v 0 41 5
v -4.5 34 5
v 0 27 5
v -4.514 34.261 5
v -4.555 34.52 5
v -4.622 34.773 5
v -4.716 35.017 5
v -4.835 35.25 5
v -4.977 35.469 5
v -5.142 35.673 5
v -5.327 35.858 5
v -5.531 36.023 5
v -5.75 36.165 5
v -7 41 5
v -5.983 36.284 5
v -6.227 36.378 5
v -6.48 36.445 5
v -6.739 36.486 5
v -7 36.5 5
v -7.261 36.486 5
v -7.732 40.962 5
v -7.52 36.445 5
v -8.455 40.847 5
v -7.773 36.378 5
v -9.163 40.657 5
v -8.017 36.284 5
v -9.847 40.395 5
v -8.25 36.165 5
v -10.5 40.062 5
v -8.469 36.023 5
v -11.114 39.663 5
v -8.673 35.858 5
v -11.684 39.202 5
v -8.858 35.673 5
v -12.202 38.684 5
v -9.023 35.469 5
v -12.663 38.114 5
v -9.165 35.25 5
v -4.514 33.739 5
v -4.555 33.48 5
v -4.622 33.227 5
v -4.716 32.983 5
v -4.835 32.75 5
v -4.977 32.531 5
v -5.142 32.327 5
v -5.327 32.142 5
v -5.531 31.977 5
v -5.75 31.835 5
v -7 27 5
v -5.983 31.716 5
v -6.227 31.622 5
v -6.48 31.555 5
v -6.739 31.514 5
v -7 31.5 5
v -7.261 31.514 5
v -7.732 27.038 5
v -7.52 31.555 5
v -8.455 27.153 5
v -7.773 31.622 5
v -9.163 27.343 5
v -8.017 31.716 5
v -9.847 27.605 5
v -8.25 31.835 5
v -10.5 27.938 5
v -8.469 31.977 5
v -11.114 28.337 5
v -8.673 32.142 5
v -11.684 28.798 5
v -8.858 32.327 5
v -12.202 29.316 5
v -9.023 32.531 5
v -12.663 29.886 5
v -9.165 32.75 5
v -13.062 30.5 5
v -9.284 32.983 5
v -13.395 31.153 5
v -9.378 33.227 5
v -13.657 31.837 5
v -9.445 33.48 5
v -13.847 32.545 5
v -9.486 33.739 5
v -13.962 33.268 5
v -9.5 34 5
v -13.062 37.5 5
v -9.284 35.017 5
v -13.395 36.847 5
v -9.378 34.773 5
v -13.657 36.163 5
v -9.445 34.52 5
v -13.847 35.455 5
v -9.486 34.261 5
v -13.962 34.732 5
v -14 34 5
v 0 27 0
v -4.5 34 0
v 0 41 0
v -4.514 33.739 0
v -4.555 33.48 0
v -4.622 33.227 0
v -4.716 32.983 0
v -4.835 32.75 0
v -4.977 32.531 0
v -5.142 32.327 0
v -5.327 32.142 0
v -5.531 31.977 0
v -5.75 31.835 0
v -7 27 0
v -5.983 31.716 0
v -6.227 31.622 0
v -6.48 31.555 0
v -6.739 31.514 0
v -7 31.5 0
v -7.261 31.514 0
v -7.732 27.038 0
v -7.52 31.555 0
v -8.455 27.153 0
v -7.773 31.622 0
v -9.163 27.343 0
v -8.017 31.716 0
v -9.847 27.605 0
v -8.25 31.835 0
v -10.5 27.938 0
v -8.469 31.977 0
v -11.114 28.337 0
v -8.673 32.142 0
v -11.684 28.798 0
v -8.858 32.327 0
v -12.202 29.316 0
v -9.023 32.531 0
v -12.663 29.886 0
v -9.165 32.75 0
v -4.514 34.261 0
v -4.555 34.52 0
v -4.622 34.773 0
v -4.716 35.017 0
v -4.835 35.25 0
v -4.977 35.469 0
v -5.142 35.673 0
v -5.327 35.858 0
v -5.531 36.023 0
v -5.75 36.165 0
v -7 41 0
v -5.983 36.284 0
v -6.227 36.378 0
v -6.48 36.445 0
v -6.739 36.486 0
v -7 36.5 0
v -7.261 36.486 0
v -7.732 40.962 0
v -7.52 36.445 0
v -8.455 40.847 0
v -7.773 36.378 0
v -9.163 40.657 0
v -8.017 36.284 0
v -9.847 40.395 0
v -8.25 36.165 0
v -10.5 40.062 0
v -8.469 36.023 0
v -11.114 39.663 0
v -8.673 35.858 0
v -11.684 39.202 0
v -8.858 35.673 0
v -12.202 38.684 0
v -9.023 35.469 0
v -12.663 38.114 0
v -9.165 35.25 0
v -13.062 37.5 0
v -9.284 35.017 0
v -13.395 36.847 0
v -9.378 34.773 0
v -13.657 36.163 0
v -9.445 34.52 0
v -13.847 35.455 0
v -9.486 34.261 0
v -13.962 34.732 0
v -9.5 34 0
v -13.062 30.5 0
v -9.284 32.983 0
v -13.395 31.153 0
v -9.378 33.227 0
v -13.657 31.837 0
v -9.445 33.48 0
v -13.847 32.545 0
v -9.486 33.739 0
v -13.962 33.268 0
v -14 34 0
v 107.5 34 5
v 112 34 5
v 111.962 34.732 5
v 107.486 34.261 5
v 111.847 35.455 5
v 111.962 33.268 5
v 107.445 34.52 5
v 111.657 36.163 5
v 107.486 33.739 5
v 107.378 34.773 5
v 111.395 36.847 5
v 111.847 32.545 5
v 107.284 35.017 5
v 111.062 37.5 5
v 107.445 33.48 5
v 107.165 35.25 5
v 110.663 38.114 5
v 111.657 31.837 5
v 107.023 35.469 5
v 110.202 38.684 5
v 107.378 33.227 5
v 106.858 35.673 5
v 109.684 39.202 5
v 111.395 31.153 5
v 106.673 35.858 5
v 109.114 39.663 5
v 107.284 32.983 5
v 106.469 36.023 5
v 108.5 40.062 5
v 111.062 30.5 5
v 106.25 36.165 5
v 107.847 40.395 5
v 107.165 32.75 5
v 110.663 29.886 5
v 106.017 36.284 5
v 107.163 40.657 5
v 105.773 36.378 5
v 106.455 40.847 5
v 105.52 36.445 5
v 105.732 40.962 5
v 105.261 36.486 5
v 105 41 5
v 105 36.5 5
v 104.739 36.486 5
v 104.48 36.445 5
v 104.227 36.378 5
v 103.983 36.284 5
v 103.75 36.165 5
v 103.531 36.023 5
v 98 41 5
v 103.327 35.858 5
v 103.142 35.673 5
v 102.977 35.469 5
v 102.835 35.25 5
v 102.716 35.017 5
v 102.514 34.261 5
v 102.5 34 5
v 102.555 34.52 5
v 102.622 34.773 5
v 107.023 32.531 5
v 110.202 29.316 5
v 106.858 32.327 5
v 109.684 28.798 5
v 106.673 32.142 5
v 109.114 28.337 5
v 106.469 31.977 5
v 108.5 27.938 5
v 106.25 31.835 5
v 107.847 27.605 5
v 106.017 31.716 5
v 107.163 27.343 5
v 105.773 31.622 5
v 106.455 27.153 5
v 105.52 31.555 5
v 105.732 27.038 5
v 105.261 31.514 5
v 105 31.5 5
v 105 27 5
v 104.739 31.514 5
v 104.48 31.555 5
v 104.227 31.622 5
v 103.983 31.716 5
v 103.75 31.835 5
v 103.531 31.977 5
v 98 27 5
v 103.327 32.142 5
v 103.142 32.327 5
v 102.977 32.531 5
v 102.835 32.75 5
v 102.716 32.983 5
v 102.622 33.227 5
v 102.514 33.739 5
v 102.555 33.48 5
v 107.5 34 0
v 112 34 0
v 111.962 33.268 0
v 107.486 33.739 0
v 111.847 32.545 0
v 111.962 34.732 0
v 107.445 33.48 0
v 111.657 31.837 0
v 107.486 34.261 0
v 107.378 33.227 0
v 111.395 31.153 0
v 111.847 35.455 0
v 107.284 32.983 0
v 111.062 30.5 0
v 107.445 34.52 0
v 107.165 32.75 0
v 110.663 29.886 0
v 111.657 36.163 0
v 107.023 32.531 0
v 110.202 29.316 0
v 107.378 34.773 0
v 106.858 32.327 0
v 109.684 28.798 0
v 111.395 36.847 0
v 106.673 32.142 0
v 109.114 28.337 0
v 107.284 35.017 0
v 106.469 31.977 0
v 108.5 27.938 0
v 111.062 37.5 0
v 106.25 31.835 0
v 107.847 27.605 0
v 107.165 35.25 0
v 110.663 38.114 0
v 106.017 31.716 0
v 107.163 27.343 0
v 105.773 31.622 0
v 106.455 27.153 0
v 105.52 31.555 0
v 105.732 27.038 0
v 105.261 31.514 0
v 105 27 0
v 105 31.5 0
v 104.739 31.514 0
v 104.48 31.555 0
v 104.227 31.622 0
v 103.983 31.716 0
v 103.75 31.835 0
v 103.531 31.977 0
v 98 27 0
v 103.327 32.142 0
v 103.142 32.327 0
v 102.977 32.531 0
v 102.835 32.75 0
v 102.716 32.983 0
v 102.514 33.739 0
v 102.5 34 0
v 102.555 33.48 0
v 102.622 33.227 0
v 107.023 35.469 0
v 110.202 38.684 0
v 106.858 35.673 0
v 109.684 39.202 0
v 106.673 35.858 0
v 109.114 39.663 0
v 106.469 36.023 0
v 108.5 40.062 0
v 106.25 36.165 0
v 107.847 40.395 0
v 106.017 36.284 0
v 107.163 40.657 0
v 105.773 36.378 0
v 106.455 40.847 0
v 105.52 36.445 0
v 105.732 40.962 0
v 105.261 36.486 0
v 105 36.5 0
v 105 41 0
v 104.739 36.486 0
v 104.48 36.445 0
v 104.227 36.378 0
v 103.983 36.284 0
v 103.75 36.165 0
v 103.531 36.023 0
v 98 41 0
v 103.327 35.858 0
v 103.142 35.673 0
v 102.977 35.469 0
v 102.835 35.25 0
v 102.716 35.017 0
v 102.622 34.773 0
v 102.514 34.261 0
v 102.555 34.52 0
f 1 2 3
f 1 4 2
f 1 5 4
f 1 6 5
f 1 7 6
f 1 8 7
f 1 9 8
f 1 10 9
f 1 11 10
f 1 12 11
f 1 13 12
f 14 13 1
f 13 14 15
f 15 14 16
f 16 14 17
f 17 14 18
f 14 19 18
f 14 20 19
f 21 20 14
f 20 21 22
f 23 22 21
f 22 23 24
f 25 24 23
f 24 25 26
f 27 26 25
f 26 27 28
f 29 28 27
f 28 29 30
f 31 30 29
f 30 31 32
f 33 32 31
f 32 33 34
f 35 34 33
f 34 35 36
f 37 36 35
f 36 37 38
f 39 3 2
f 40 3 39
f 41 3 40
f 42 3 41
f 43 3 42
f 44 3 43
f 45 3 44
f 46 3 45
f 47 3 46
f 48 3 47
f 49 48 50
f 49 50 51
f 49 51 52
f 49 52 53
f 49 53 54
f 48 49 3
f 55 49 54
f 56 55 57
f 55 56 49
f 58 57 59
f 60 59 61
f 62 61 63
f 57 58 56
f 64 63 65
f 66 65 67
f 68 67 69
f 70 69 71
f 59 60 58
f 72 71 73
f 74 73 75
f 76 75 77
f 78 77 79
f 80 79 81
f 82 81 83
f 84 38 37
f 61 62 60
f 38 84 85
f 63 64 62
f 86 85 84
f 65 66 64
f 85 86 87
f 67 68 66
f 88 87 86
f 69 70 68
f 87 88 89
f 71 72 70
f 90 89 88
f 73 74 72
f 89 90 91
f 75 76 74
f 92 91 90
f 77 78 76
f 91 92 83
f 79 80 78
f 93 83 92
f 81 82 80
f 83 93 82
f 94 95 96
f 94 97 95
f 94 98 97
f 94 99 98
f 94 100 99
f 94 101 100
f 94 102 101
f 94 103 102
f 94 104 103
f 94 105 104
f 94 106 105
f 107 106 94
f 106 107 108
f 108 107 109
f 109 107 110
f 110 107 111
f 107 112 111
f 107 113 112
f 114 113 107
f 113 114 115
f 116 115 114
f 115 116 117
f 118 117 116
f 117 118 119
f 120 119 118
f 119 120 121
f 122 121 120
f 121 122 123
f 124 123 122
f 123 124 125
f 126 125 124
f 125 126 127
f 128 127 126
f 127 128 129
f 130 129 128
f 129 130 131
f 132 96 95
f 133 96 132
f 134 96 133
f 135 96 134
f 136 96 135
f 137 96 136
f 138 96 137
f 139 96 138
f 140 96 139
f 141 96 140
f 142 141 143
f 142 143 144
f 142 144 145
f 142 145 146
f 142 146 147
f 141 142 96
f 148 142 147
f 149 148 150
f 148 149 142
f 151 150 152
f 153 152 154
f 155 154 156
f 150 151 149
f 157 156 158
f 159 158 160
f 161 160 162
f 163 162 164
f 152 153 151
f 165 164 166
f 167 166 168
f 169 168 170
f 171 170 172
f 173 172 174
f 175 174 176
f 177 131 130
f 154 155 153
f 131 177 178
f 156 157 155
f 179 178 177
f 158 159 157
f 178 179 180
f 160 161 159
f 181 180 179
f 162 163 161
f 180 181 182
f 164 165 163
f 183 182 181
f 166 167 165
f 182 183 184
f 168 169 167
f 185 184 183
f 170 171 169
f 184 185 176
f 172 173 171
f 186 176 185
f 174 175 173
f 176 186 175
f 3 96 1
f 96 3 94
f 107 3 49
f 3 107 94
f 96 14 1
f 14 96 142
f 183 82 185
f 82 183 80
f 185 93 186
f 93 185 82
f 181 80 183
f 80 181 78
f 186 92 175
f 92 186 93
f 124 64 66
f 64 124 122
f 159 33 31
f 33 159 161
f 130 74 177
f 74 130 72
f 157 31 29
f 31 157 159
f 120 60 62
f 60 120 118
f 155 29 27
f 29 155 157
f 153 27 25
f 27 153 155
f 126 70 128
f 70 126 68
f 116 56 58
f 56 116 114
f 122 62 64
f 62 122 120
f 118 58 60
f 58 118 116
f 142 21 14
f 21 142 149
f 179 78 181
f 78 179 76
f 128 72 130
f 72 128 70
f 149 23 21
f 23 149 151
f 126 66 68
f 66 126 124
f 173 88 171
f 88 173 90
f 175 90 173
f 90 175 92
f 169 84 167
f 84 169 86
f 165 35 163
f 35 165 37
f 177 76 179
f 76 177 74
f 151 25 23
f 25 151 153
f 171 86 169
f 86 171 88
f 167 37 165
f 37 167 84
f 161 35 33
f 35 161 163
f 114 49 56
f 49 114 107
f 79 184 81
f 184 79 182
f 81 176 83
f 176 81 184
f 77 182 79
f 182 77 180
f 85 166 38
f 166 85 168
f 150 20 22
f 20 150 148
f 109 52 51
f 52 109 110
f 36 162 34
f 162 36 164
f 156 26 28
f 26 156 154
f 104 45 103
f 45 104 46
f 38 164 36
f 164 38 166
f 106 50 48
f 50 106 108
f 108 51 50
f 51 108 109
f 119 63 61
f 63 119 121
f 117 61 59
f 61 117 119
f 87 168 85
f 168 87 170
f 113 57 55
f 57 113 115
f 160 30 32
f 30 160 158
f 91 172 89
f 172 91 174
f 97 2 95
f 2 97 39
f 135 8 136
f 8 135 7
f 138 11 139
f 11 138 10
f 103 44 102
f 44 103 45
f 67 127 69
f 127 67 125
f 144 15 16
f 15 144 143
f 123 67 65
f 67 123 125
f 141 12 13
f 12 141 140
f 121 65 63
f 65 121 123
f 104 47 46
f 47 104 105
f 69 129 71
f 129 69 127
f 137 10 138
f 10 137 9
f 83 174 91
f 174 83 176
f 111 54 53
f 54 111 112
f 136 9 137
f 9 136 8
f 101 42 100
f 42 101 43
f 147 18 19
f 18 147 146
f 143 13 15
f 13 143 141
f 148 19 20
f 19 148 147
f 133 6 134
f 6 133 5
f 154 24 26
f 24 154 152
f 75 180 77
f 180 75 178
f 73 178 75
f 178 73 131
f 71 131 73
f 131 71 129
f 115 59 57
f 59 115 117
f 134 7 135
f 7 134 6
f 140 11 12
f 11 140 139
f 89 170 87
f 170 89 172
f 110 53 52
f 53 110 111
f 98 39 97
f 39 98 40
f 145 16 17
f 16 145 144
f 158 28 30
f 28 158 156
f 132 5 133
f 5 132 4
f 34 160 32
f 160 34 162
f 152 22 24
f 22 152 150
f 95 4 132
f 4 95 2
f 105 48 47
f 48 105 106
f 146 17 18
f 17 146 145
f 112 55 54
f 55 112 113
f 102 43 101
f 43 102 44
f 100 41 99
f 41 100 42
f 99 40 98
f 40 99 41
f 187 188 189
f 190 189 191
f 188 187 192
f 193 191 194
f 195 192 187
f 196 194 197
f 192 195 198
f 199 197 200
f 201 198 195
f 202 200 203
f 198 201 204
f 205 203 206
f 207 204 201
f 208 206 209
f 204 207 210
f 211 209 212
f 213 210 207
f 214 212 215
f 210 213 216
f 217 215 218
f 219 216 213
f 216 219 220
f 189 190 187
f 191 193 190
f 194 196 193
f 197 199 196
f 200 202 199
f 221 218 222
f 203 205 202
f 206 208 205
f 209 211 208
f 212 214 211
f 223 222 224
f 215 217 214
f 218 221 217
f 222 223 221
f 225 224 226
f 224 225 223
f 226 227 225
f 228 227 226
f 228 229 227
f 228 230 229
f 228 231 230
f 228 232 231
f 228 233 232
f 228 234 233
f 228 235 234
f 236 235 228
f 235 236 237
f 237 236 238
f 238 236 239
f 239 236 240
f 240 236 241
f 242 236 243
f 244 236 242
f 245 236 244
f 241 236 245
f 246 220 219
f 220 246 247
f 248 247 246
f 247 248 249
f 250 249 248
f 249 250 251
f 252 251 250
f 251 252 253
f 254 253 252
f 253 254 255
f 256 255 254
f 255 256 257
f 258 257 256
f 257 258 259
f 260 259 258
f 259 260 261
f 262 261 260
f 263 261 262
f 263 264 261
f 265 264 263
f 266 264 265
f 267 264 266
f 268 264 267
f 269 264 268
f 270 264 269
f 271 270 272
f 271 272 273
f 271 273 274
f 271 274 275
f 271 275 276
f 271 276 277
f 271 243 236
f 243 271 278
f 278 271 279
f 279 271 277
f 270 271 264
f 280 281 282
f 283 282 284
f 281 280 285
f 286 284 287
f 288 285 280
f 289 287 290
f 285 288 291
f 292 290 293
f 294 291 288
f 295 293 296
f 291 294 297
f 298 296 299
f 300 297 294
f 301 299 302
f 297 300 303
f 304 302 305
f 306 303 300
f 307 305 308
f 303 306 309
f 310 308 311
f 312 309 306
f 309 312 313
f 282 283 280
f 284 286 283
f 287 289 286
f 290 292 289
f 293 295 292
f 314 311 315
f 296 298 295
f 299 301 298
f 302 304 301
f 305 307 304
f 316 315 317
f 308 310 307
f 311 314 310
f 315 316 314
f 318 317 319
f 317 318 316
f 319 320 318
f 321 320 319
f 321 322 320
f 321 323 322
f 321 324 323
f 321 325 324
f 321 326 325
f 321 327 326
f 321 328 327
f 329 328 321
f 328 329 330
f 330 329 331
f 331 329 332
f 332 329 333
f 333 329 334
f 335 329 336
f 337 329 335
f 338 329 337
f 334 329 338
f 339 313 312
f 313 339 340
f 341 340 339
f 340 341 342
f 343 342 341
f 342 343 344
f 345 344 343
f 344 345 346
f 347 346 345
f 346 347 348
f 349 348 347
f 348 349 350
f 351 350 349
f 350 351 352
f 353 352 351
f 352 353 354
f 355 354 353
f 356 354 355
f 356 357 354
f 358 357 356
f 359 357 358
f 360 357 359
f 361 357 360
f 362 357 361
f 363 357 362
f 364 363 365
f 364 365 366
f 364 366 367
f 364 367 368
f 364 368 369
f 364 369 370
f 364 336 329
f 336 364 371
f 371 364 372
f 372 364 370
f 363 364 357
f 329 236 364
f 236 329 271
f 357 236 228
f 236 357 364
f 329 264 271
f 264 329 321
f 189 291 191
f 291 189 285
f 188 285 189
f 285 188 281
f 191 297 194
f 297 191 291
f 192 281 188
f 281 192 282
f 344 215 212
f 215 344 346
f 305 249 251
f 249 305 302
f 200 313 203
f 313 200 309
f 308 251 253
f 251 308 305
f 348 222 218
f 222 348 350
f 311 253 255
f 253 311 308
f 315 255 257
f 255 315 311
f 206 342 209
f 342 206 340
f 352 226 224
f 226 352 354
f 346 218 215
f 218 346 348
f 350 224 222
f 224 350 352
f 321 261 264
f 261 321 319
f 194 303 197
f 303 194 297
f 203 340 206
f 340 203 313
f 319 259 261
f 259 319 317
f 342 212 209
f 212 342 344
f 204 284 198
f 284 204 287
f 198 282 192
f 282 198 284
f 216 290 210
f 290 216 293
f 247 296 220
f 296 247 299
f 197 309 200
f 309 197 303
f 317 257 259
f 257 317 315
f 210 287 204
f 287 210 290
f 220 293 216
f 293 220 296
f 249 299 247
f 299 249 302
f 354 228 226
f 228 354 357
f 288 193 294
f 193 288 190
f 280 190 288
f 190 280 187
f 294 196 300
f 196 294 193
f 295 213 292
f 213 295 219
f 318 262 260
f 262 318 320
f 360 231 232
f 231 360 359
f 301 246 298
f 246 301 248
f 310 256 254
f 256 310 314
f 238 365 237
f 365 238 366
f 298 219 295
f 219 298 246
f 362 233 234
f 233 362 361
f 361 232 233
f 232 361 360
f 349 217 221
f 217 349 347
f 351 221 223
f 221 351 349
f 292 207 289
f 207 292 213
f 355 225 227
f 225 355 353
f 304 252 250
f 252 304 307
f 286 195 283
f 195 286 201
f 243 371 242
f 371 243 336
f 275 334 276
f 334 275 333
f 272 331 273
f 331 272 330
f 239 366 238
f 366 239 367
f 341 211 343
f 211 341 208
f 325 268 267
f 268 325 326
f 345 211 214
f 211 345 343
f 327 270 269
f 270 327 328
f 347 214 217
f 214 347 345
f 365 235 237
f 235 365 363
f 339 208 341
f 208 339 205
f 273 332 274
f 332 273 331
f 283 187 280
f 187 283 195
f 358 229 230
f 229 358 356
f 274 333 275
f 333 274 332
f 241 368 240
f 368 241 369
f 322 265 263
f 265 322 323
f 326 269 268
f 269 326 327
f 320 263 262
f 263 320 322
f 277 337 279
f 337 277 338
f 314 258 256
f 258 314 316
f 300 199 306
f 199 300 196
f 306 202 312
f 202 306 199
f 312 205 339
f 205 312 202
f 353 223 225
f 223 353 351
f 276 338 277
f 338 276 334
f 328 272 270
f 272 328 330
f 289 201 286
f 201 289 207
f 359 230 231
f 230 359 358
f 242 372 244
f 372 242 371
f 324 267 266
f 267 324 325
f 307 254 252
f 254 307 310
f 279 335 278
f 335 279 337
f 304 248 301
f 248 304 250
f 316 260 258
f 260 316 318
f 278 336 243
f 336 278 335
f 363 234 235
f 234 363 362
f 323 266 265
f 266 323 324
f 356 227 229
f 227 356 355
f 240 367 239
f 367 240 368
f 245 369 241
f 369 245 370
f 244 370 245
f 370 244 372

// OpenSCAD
// file: ../../00_common/screw_bosses.scad
// =============================================================================
// OpenMotorBridge - Screw Bosses & Fastener Primitives
// =============================================================================
// File: hardware/cad/scad/00_common/screw_bosses.scad
// Description: Reusable parametric modules for screw standoffs, corner clamping
//              posts, and mounting ears.
// =============================================================================

include <parameters.scad>;

// 1. Cylindrical Screw Standoff Boss (with center hole)
module screw_boss(outer_r=2.5, inner_r=1.2, h=5.0) {
    difference() {
        cylinder(r=outer_r, h=h, center=false);
        translate([0, 0, -0.1])
            cylinder(r=inner_r, h=h + 0.2, center=false);
    }
}

// 2. Rectangular Corner Clamping Post (with center screw hole)
module corner_screw_post(size_x=5.0, size_y=5.0, h=12.0, hole_r=1.65, hole_h=10.0, hole_offset_z=2.0) {
    difference() {
        cube(size=[size_x, size_y, h], center=false);
        translate([size_x/2.0, size_y/2.0, hole_offset_z])
            cylinder(r=hole_r, h=hole_h + 0.1, center=false);
    }
}

// 3. M4 Silentblock Outer Mounting Ear (Centered in Y around y=0, extends along +X)
module mounting_ear_m4(ear_len=14.0, ear_w=12.0, ear_h=5.0, hole_r=2.2) {
    difference() {
        union() {
            translate([0, -ear_w/2.0, 0])
                cube(size=[ear_len - ear_w/2.0, ear_w, ear_h], center=false);
            translate([ear_len - ear_w/2.0, 0, 0])
                cylinder(r=ear_w/2.0, h=ear_h, center=false);
        }
        translate([ear_len - ear_w/2.0, 0, -0.1])
            cylinder(r=hole_r, h=ear_h + 0.2, center=false);
    }
}

// 4. Captive Hex Nut Pocket (DIN 934 / DIN 985 with center screw through-hole)
module hex_nut_pocket(sw=NUT_M4_SW, h=NUT_M4_H, screw_r=M4_SCREW_HOLE_R, through_h=10.0) {
    // Hexagonal pocket (flat-to-flat SW converted to circle radius: r = sw / sqrt(3))
    hex_r = sw / sqrt(3);
    union() {
        // Hexagonal nut pocket
        cylinder(r=hex_r, h=h, center=false, $fn=6);
        // Screw clearance through-hole
        translate([0, 0, -through_h/2.0])
            cylinder(r=screw_r, h=through_h + h, center=false, $fn=30);
    }
}
// file: ../../00_common/parameters.scad
// =============================================================================
// OpenMotorBridge - Global CAD Parameters & Settings
// =============================================================================
// File: hardware/cad/scad/00_common/parameters.scad
// Description: Global dimensional constants, manufacturing clearances and
//              circle resolution ($fn) for all OpenSCAD modules.
// =============================================================================

// --- 1. Circle & Curve Resolution ---
$fn = 60; // Smooth cylinders and holes for high-quality MJF 3D printing

// --- 2. Central Main Box Dimensions (3-Tier Sandwich) ---
MAIN_BOX_OUTER_L      = 110.0; // Outer length in X (mm)
MAIN_BOX_OUTER_W      = 74.0;  // Outer width in Y (mm)
MAIN_BOX_LOWER_H      = 17.0;  // Lower case height in Z (mm)
MAIN_BOX_MID_H        = 15.0;  // Mid tray height in Z (mm)
MAIN_BOX_LID_H        = 4.0;   // Lid plate thickness in Z (mm)
MAIN_BOX_WALL         = 2.5;   // Nominal wall thickness (mm)
MAIN_BOX_CORNER_POST  = 7.0;   // Corner clamping screw post size (mm, for M3 hex nut pockets)

// --- 3. Satellite Pod Dimensions (Universal Enlarged Envelope) ---
POD_OUTER_L           = 135.0; // Outer length in X (mm)
POD_OUTER_W           = 70.0;  // Outer width in Y (mm)
POD_OUTER_H           = 38.0;  // Outer height in Z (mm)
POD_WALL              = 3.5;   // Nominal wall thickness (mm)
POD_BULKHEAD_X        = 18.0;  // Partition bulkhead position in X (mm)
POD_CHAMBER_L         = 117.0; // Sliding chamber length in X (mm)
POD_CHAMBER_W         = 63.0;  // Sliding chamber width in Y (mm)
POD_CHAMBER_H         = 31.0;  // Sliding chamber height in Z (mm)

// --- 4. Pod Linear Guide Rails (Poka-Yoke Tongue & Groove) ---
POD_GROOVE_W          = 3.0;   // Internal guide groove width in Z (mm)
POD_GROOVE_DEPTH      = 1.5;   // Internal guide groove depth in Y (mm)
POD_GROOVE_LEFT_Z     = 10.0;  // Center height of left groove (mm)
POD_GROOVE_RIGHT_Z    = 18.0;  // Center height of right groove (mm, asym offset)

CARTRIDGE_TONGUE_W    = 2.6;   // Cartridge tongue rail height in Z (mm, 0.2mm clearance)
CARTRIDGE_TONGUE_PROT = 1.4;   // Cartridge tongue protrusion in Y (mm, 0.1mm clearance)
CARTRIDGE_CHAMFER_L   = 4.0;   // 30° lead-in chamfer nose length (mm)

// --- 5. Cartridge Dimensions (Enlarged Universal Sled) ---
CARTRIDGE_BASE_L      = 116.0; // Sled length in X (mm)
CARTRIDGE_BASE_W      = 58.0;  // Sled width in Y (mm)
CARTRIDGE_BASE_H      = 28.0;  // Sled height in Z (mm)
CARTRIDGE_FACE_L      = 4.0;   // Front faceplate thickness in X (mm)
CARTRIDGE_FACE_W      = 64.0;  // Front faceplate width in Y (mm)
CARTRIDGE_FACE_H      = 34.0;  // Front faceplate height in Z (mm)

// --- 5a. RF Interface & Sealing Dimensions ---
SMA_BORE_R            = 3.25;  // Ø 6.5 mm through-hole for standard SMA bulkhead
SMA_ORECESS_R         = 4.75;  // Ø 9.5 mm recess for waterproof silicone O-ring
SMA_ORECESS_DEPTH     = 1.2;   // 1.2 mm deep O-ring compression pocket

// --- 5b. Magnetic Anti-Theft Lock System ---
LATCH_PIVOT_X         = 58.0;  // Center pivot position along sled X (mm)
LATCH_MAGNET_X        = 46.0;  // Ferromagnetic anchor position along sled X (mm)
LATCH_TOOTH_X         = 70.0;  // Locking sawtooth pawl position along sled X (mm)
LATCH_ARM_H           = 6.0;   // Rocker lever height in Z (mm)
LATCH_ARM_THICK       = 2.6;   // Rocker beam thickness in Y (mm)
LATCH_MAGNET_PIN_DIA  = 6.2;   // Bore for Ø 6.0 mm steel dowel pin (mm)
LATCH_SPRING_DIA      = 3.8;   // Bore for Ø 3.5 mm return compression spring (mm)

// --- 6. Standard Captive Hex Nut Pockets (DIN 934 / DIN 985 with +0.2 mm MJF/FDM clearance) ---
NUT_M2_SW             = 4.2;   // M2 across flats (nominal 4.0 mm)
NUT_M2_H              = 1.8;   // M2 thickness (nominal 1.6 mm)
NUT_M2_5_SW           = 5.2;   // M2.5 across flats (nominal 5.0 mm)
NUT_M2_5_H            = 2.2;   // M2.5 thickness (nominal 2.0 mm)
NUT_M3_SW             = 5.7;   // M3 across flats (nominal 5.5 mm)
NUT_M3_H              = 2.6;   // M3 thickness (nominal 2.4 mm)
NUT_M4_SW             = 7.2;   // M4 across flats (nominal 7.0 mm)
NUT_M4_H              = 3.4;   // M4 thickness (nominal 3.2 mm)
NUT_M5_SW             = 8.2;   // M5 across flats (nominal 8.0 mm)
NUT_M5_H              = 4.2;   // M5 thickness (nominal 4.0 mm)

// Direct Plastic Thread-Forming / Self-Tapping Pilot Holes in PA12 (100% Soldering-Iron Free)
M2_PILOT_HOLE_R       = 0.85;  // Core hole for M2 screws in PA12 (Ø 1.7 mm)
M2_5_PILOT_HOLE_R     = 1.05;  // Core hole for M2.5 screws in PA12 (Ø 2.1 mm)
M3_PILOT_HOLE_R       = 1.25;  // Core hole for M3 screws in PA12 (Ø 2.5 mm)

// --- 7. Screw & Clearance Dimensions ---
M2_SCREW_HOLE_R       = 1.1;   // M2 clearance hole (r = 1.1 mm -> Ø 2.2 mm)
M2_5_SCREW_HOLE_R     = 1.4;   // M2.5 clearance hole (r = 1.4 mm -> Ø 2.8 mm)
M3_SCREW_HOLE_R       = 1.65;  // M3 clearance hole (r = 1.65 mm -> Ø 3.3 mm)
M4_SCREW_HOLE_R       = 2.2;   // M4 clearance hole (r = 2.2 mm -> Ø 4.4 mm)
M8_BORE_R             = 4.0;   // M8 cable through-bore (r = 4.0 mm -> Ø 8.0 mm)
M8_STUDS_OUTER_R      = 6.0;   // M8 neck outer radius (Ø 12.0 mm)

// --- 8. Universal Front Node Enclosure Dimensions (Type E: 98 x 68 x 25 mm) ---
FRONT_NODE_PCB_L      = 82.0;  // PCB length in X (mm, PCBA 05)
FRONT_NODE_PCB_W      = 50.0;  // PCB width in Y (mm, PCBA 05)
FRONT_NODE_PCB_H      = 1.6;   // PCB thickness in Z (mm)
FRONT_NODE_PCB_R      = 2.5;   // PCB corner radius (mm)

FRONT_NODE_CHAMBER_L  = 86.0;  // Internal chamber length in X (mm, 2mm margin per side)
FRONT_NODE_CHAMBER_W  = 56.0;  // Internal chamber width in Y (mm, 3mm margin per side)
FRONT_NODE_TUB_H      = 17.5;  // Lower tub depth in Z (mm)
FRONT_NODE_LID_H      = 7.5;   // Upper lid height in Z (mm)
FRONT_NODE_WALL       = 2.5;   // Wall thickness in HP MJF PA12 (mm)
FRONT_NODE_CORNER_R   = 4.0;   // Outer enclosure corner radius (mm)

FRONT_NODE_OUTER_L    = FRONT_NODE_CHAMBER_L + 2 * FRONT_NODE_WALL + 7.0; // 98.0 mm
FRONT_NODE_OUTER_W    = FRONT_NODE_CHAMBER_W + 2 * FRONT_NODE_WALL + 7.0; // 68.0 mm
FRONT_NODE_OUTER_H    = FRONT_NODE_TUB_H + FRONT_NODE_LID_H;              // 25.0 mm

// PCB Standoff Heights & Radii (100% Soldering-Iron Free)
FRONT_NODE_STANDOFF_H = 3.0;   // Height of PCB standoffs from floor (mm)
FRONT_NODE_STANDOFF_R = 3.0;   // Outer radius of M2.5 screw bosses (mm)
FRONT_NODE_CORE_HOLE_R= M2_5_PILOT_HOLE_R; // Core hole for direct M2.5 screw engagement (Ø 2.1 mm)

// AMPS 4-Hole Mounting Pattern (38 x 30 mm with DIN 934 M4 Captive Nut Pockets)
AMPS_SPACING_X        = 38.0;  // AMPS hole distance in X (mm)
AMPS_SPACING_Y        = 30.0;  // AMPS hole distance in Y (mm)
AMPS_NUT_SW           = NUT_M4_SW; // Captive M4 hex nut pocket across flats (7.2 mm)
AMPS_NUT_H            = NUT_M4_H;  // Captive M4 hex nut pocket depth (3.4 mm)

// Acoustic Vent for Knowles SPH0645 MEMS
FRONT_NODE_MIC_HOLE_R = 1.25;  // Sound canal radius (Ø 2.5 mm)
FRONT_NODE_MIC_MEMB_R = 3.0;   // Gore ePTFE membrane pocket radius (Ø 6.0 mm)
FRONT_NODE_MIC_MEMB_D = 0.8;   // Membrane pocket depth (mm)
// main file
// =============================================================================
// OpenMotorBridge - Front Node: 4-in-1 Universal Mounting System
// =============================================================================
// File: hardware/cad/scad/04_front_node/parts/004_mounting_system.scad
// Description: Multi-bike mounting interfaces:
//              1. AMPS 4-hole pattern (38x30 mm, M4 threaded brass inserts)
//              2. 90° crossed zip-tie & hose clamp channels
//              3. 2x M4/M5 slotted silentblock mounting ears
//              4. Recessed 3M Dual-Lock / VHB tape landing pad
// =============================================================================

include <../../00_common/parameters.scad>;
include <../../00_common/screw_bosses.scad>;

CENTER_X = FRONT_NODE_OUTER_L / 2.0; // 49.0 mm
CENTER_Y = FRONT_NODE_OUTER_W / 2.0; // 34.0 mm

// 1. AMPS 4-Hole Captive Hex Nut Pockets (DIN 934 M4, 100% Soldering-Iron Free)
module front_node_amps_cutouts(h_depth = 3.6) {
    amps_coords = [
        [CENTER_X - AMPS_SPACING_X / 2.0, CENTER_Y - AMPS_SPACING_Y / 2.0], // [30.0, 19.0]
        [CENTER_X + AMPS_SPACING_X / 2.0, CENTER_Y - AMPS_SPACING_Y / 2.0], // [68.0, 19.0]
        [CENTER_X - AMPS_SPACING_X / 2.0, CENTER_Y + AMPS_SPACING_Y / 2.0], // [30.0, 49.0]
        [CENTER_X + AMPS_SPACING_X / 2.0, CENTER_Y + AMPS_SPACING_Y / 2.0]  // [68.0, 49.0]
    ];
    
    for (pt = amps_coords) {
        translate([pt[0], pt[1], -0.1])
            hex_nut_pocket(sw=AMPS_NUT_SW, h=AMPS_NUT_H, screw_r=M4_SCREW_HOLE_R, through_h=8.0);
    }
}

// 2. Crossed Zip-Tie & Hose Clamp Tunnels (Subtractive in floor)
module front_node_ziptie_tunnels(slot_w = 5.5, slot_depth = 1.4) {
    // A. Longitudinal tunnel along X (centered in Y)
    translate([-1.0, CENTER_Y - slot_w/2.0, -0.1])
        cube(size=[FRONT_NODE_OUTER_L + 2.0, slot_w, slot_depth + 0.1], center=false);
        
    // B. Transverse tunnel along Y (centered in X)
    translate([CENTER_X - slot_w/2.0, -1.0, -0.1])
        cube(size=[slot_w, FRONT_NODE_OUTER_W + 2.0, slot_depth + 0.1], center=false);
}

// 3. 3M Dual-Lock / VHB Tape Recessed Landing Pad (Subtractive in floor)
module front_node_dual_lock_recess(pad_l = 50.0, pad_w = 28.0, pad_depth = 0.6) {
    translate([CENTER_X - pad_l/2.0, CENTER_Y - pad_w/2.0, -0.1])
        cube(size=[pad_l, pad_w, pad_depth + 0.1], center=false);
}

// 4. M4/M5 Slotted Silentblock Flange Mounting Ears (Additive to enclosure tub)
module front_node_flange_ears(ear_len = 14.0, ear_w = 14.0, ear_h = 5.0, hole_r = 2.5) {
    // Left ear (at X = 0, centered in Y)
    translate([0, CENTER_Y, 0])
        rotate([0, 0, 180])
            mounting_ear_m4(ear_len=ear_len, ear_w=ear_w, ear_h=ear_h, hole_r=hole_r);
            
    // Right ear (at X = FRONT_NODE_OUTER_L, centered in Y)
    translate([FRONT_NODE_OUTER_L, CENTER_Y, 0])
        mounting_ear_m4(ear_len=ear_len, ear_w=ear_w, ear_h=ear_h, hole_r=hole_r);
}

// Standalone render / STL export
front_node_flange_ears();
